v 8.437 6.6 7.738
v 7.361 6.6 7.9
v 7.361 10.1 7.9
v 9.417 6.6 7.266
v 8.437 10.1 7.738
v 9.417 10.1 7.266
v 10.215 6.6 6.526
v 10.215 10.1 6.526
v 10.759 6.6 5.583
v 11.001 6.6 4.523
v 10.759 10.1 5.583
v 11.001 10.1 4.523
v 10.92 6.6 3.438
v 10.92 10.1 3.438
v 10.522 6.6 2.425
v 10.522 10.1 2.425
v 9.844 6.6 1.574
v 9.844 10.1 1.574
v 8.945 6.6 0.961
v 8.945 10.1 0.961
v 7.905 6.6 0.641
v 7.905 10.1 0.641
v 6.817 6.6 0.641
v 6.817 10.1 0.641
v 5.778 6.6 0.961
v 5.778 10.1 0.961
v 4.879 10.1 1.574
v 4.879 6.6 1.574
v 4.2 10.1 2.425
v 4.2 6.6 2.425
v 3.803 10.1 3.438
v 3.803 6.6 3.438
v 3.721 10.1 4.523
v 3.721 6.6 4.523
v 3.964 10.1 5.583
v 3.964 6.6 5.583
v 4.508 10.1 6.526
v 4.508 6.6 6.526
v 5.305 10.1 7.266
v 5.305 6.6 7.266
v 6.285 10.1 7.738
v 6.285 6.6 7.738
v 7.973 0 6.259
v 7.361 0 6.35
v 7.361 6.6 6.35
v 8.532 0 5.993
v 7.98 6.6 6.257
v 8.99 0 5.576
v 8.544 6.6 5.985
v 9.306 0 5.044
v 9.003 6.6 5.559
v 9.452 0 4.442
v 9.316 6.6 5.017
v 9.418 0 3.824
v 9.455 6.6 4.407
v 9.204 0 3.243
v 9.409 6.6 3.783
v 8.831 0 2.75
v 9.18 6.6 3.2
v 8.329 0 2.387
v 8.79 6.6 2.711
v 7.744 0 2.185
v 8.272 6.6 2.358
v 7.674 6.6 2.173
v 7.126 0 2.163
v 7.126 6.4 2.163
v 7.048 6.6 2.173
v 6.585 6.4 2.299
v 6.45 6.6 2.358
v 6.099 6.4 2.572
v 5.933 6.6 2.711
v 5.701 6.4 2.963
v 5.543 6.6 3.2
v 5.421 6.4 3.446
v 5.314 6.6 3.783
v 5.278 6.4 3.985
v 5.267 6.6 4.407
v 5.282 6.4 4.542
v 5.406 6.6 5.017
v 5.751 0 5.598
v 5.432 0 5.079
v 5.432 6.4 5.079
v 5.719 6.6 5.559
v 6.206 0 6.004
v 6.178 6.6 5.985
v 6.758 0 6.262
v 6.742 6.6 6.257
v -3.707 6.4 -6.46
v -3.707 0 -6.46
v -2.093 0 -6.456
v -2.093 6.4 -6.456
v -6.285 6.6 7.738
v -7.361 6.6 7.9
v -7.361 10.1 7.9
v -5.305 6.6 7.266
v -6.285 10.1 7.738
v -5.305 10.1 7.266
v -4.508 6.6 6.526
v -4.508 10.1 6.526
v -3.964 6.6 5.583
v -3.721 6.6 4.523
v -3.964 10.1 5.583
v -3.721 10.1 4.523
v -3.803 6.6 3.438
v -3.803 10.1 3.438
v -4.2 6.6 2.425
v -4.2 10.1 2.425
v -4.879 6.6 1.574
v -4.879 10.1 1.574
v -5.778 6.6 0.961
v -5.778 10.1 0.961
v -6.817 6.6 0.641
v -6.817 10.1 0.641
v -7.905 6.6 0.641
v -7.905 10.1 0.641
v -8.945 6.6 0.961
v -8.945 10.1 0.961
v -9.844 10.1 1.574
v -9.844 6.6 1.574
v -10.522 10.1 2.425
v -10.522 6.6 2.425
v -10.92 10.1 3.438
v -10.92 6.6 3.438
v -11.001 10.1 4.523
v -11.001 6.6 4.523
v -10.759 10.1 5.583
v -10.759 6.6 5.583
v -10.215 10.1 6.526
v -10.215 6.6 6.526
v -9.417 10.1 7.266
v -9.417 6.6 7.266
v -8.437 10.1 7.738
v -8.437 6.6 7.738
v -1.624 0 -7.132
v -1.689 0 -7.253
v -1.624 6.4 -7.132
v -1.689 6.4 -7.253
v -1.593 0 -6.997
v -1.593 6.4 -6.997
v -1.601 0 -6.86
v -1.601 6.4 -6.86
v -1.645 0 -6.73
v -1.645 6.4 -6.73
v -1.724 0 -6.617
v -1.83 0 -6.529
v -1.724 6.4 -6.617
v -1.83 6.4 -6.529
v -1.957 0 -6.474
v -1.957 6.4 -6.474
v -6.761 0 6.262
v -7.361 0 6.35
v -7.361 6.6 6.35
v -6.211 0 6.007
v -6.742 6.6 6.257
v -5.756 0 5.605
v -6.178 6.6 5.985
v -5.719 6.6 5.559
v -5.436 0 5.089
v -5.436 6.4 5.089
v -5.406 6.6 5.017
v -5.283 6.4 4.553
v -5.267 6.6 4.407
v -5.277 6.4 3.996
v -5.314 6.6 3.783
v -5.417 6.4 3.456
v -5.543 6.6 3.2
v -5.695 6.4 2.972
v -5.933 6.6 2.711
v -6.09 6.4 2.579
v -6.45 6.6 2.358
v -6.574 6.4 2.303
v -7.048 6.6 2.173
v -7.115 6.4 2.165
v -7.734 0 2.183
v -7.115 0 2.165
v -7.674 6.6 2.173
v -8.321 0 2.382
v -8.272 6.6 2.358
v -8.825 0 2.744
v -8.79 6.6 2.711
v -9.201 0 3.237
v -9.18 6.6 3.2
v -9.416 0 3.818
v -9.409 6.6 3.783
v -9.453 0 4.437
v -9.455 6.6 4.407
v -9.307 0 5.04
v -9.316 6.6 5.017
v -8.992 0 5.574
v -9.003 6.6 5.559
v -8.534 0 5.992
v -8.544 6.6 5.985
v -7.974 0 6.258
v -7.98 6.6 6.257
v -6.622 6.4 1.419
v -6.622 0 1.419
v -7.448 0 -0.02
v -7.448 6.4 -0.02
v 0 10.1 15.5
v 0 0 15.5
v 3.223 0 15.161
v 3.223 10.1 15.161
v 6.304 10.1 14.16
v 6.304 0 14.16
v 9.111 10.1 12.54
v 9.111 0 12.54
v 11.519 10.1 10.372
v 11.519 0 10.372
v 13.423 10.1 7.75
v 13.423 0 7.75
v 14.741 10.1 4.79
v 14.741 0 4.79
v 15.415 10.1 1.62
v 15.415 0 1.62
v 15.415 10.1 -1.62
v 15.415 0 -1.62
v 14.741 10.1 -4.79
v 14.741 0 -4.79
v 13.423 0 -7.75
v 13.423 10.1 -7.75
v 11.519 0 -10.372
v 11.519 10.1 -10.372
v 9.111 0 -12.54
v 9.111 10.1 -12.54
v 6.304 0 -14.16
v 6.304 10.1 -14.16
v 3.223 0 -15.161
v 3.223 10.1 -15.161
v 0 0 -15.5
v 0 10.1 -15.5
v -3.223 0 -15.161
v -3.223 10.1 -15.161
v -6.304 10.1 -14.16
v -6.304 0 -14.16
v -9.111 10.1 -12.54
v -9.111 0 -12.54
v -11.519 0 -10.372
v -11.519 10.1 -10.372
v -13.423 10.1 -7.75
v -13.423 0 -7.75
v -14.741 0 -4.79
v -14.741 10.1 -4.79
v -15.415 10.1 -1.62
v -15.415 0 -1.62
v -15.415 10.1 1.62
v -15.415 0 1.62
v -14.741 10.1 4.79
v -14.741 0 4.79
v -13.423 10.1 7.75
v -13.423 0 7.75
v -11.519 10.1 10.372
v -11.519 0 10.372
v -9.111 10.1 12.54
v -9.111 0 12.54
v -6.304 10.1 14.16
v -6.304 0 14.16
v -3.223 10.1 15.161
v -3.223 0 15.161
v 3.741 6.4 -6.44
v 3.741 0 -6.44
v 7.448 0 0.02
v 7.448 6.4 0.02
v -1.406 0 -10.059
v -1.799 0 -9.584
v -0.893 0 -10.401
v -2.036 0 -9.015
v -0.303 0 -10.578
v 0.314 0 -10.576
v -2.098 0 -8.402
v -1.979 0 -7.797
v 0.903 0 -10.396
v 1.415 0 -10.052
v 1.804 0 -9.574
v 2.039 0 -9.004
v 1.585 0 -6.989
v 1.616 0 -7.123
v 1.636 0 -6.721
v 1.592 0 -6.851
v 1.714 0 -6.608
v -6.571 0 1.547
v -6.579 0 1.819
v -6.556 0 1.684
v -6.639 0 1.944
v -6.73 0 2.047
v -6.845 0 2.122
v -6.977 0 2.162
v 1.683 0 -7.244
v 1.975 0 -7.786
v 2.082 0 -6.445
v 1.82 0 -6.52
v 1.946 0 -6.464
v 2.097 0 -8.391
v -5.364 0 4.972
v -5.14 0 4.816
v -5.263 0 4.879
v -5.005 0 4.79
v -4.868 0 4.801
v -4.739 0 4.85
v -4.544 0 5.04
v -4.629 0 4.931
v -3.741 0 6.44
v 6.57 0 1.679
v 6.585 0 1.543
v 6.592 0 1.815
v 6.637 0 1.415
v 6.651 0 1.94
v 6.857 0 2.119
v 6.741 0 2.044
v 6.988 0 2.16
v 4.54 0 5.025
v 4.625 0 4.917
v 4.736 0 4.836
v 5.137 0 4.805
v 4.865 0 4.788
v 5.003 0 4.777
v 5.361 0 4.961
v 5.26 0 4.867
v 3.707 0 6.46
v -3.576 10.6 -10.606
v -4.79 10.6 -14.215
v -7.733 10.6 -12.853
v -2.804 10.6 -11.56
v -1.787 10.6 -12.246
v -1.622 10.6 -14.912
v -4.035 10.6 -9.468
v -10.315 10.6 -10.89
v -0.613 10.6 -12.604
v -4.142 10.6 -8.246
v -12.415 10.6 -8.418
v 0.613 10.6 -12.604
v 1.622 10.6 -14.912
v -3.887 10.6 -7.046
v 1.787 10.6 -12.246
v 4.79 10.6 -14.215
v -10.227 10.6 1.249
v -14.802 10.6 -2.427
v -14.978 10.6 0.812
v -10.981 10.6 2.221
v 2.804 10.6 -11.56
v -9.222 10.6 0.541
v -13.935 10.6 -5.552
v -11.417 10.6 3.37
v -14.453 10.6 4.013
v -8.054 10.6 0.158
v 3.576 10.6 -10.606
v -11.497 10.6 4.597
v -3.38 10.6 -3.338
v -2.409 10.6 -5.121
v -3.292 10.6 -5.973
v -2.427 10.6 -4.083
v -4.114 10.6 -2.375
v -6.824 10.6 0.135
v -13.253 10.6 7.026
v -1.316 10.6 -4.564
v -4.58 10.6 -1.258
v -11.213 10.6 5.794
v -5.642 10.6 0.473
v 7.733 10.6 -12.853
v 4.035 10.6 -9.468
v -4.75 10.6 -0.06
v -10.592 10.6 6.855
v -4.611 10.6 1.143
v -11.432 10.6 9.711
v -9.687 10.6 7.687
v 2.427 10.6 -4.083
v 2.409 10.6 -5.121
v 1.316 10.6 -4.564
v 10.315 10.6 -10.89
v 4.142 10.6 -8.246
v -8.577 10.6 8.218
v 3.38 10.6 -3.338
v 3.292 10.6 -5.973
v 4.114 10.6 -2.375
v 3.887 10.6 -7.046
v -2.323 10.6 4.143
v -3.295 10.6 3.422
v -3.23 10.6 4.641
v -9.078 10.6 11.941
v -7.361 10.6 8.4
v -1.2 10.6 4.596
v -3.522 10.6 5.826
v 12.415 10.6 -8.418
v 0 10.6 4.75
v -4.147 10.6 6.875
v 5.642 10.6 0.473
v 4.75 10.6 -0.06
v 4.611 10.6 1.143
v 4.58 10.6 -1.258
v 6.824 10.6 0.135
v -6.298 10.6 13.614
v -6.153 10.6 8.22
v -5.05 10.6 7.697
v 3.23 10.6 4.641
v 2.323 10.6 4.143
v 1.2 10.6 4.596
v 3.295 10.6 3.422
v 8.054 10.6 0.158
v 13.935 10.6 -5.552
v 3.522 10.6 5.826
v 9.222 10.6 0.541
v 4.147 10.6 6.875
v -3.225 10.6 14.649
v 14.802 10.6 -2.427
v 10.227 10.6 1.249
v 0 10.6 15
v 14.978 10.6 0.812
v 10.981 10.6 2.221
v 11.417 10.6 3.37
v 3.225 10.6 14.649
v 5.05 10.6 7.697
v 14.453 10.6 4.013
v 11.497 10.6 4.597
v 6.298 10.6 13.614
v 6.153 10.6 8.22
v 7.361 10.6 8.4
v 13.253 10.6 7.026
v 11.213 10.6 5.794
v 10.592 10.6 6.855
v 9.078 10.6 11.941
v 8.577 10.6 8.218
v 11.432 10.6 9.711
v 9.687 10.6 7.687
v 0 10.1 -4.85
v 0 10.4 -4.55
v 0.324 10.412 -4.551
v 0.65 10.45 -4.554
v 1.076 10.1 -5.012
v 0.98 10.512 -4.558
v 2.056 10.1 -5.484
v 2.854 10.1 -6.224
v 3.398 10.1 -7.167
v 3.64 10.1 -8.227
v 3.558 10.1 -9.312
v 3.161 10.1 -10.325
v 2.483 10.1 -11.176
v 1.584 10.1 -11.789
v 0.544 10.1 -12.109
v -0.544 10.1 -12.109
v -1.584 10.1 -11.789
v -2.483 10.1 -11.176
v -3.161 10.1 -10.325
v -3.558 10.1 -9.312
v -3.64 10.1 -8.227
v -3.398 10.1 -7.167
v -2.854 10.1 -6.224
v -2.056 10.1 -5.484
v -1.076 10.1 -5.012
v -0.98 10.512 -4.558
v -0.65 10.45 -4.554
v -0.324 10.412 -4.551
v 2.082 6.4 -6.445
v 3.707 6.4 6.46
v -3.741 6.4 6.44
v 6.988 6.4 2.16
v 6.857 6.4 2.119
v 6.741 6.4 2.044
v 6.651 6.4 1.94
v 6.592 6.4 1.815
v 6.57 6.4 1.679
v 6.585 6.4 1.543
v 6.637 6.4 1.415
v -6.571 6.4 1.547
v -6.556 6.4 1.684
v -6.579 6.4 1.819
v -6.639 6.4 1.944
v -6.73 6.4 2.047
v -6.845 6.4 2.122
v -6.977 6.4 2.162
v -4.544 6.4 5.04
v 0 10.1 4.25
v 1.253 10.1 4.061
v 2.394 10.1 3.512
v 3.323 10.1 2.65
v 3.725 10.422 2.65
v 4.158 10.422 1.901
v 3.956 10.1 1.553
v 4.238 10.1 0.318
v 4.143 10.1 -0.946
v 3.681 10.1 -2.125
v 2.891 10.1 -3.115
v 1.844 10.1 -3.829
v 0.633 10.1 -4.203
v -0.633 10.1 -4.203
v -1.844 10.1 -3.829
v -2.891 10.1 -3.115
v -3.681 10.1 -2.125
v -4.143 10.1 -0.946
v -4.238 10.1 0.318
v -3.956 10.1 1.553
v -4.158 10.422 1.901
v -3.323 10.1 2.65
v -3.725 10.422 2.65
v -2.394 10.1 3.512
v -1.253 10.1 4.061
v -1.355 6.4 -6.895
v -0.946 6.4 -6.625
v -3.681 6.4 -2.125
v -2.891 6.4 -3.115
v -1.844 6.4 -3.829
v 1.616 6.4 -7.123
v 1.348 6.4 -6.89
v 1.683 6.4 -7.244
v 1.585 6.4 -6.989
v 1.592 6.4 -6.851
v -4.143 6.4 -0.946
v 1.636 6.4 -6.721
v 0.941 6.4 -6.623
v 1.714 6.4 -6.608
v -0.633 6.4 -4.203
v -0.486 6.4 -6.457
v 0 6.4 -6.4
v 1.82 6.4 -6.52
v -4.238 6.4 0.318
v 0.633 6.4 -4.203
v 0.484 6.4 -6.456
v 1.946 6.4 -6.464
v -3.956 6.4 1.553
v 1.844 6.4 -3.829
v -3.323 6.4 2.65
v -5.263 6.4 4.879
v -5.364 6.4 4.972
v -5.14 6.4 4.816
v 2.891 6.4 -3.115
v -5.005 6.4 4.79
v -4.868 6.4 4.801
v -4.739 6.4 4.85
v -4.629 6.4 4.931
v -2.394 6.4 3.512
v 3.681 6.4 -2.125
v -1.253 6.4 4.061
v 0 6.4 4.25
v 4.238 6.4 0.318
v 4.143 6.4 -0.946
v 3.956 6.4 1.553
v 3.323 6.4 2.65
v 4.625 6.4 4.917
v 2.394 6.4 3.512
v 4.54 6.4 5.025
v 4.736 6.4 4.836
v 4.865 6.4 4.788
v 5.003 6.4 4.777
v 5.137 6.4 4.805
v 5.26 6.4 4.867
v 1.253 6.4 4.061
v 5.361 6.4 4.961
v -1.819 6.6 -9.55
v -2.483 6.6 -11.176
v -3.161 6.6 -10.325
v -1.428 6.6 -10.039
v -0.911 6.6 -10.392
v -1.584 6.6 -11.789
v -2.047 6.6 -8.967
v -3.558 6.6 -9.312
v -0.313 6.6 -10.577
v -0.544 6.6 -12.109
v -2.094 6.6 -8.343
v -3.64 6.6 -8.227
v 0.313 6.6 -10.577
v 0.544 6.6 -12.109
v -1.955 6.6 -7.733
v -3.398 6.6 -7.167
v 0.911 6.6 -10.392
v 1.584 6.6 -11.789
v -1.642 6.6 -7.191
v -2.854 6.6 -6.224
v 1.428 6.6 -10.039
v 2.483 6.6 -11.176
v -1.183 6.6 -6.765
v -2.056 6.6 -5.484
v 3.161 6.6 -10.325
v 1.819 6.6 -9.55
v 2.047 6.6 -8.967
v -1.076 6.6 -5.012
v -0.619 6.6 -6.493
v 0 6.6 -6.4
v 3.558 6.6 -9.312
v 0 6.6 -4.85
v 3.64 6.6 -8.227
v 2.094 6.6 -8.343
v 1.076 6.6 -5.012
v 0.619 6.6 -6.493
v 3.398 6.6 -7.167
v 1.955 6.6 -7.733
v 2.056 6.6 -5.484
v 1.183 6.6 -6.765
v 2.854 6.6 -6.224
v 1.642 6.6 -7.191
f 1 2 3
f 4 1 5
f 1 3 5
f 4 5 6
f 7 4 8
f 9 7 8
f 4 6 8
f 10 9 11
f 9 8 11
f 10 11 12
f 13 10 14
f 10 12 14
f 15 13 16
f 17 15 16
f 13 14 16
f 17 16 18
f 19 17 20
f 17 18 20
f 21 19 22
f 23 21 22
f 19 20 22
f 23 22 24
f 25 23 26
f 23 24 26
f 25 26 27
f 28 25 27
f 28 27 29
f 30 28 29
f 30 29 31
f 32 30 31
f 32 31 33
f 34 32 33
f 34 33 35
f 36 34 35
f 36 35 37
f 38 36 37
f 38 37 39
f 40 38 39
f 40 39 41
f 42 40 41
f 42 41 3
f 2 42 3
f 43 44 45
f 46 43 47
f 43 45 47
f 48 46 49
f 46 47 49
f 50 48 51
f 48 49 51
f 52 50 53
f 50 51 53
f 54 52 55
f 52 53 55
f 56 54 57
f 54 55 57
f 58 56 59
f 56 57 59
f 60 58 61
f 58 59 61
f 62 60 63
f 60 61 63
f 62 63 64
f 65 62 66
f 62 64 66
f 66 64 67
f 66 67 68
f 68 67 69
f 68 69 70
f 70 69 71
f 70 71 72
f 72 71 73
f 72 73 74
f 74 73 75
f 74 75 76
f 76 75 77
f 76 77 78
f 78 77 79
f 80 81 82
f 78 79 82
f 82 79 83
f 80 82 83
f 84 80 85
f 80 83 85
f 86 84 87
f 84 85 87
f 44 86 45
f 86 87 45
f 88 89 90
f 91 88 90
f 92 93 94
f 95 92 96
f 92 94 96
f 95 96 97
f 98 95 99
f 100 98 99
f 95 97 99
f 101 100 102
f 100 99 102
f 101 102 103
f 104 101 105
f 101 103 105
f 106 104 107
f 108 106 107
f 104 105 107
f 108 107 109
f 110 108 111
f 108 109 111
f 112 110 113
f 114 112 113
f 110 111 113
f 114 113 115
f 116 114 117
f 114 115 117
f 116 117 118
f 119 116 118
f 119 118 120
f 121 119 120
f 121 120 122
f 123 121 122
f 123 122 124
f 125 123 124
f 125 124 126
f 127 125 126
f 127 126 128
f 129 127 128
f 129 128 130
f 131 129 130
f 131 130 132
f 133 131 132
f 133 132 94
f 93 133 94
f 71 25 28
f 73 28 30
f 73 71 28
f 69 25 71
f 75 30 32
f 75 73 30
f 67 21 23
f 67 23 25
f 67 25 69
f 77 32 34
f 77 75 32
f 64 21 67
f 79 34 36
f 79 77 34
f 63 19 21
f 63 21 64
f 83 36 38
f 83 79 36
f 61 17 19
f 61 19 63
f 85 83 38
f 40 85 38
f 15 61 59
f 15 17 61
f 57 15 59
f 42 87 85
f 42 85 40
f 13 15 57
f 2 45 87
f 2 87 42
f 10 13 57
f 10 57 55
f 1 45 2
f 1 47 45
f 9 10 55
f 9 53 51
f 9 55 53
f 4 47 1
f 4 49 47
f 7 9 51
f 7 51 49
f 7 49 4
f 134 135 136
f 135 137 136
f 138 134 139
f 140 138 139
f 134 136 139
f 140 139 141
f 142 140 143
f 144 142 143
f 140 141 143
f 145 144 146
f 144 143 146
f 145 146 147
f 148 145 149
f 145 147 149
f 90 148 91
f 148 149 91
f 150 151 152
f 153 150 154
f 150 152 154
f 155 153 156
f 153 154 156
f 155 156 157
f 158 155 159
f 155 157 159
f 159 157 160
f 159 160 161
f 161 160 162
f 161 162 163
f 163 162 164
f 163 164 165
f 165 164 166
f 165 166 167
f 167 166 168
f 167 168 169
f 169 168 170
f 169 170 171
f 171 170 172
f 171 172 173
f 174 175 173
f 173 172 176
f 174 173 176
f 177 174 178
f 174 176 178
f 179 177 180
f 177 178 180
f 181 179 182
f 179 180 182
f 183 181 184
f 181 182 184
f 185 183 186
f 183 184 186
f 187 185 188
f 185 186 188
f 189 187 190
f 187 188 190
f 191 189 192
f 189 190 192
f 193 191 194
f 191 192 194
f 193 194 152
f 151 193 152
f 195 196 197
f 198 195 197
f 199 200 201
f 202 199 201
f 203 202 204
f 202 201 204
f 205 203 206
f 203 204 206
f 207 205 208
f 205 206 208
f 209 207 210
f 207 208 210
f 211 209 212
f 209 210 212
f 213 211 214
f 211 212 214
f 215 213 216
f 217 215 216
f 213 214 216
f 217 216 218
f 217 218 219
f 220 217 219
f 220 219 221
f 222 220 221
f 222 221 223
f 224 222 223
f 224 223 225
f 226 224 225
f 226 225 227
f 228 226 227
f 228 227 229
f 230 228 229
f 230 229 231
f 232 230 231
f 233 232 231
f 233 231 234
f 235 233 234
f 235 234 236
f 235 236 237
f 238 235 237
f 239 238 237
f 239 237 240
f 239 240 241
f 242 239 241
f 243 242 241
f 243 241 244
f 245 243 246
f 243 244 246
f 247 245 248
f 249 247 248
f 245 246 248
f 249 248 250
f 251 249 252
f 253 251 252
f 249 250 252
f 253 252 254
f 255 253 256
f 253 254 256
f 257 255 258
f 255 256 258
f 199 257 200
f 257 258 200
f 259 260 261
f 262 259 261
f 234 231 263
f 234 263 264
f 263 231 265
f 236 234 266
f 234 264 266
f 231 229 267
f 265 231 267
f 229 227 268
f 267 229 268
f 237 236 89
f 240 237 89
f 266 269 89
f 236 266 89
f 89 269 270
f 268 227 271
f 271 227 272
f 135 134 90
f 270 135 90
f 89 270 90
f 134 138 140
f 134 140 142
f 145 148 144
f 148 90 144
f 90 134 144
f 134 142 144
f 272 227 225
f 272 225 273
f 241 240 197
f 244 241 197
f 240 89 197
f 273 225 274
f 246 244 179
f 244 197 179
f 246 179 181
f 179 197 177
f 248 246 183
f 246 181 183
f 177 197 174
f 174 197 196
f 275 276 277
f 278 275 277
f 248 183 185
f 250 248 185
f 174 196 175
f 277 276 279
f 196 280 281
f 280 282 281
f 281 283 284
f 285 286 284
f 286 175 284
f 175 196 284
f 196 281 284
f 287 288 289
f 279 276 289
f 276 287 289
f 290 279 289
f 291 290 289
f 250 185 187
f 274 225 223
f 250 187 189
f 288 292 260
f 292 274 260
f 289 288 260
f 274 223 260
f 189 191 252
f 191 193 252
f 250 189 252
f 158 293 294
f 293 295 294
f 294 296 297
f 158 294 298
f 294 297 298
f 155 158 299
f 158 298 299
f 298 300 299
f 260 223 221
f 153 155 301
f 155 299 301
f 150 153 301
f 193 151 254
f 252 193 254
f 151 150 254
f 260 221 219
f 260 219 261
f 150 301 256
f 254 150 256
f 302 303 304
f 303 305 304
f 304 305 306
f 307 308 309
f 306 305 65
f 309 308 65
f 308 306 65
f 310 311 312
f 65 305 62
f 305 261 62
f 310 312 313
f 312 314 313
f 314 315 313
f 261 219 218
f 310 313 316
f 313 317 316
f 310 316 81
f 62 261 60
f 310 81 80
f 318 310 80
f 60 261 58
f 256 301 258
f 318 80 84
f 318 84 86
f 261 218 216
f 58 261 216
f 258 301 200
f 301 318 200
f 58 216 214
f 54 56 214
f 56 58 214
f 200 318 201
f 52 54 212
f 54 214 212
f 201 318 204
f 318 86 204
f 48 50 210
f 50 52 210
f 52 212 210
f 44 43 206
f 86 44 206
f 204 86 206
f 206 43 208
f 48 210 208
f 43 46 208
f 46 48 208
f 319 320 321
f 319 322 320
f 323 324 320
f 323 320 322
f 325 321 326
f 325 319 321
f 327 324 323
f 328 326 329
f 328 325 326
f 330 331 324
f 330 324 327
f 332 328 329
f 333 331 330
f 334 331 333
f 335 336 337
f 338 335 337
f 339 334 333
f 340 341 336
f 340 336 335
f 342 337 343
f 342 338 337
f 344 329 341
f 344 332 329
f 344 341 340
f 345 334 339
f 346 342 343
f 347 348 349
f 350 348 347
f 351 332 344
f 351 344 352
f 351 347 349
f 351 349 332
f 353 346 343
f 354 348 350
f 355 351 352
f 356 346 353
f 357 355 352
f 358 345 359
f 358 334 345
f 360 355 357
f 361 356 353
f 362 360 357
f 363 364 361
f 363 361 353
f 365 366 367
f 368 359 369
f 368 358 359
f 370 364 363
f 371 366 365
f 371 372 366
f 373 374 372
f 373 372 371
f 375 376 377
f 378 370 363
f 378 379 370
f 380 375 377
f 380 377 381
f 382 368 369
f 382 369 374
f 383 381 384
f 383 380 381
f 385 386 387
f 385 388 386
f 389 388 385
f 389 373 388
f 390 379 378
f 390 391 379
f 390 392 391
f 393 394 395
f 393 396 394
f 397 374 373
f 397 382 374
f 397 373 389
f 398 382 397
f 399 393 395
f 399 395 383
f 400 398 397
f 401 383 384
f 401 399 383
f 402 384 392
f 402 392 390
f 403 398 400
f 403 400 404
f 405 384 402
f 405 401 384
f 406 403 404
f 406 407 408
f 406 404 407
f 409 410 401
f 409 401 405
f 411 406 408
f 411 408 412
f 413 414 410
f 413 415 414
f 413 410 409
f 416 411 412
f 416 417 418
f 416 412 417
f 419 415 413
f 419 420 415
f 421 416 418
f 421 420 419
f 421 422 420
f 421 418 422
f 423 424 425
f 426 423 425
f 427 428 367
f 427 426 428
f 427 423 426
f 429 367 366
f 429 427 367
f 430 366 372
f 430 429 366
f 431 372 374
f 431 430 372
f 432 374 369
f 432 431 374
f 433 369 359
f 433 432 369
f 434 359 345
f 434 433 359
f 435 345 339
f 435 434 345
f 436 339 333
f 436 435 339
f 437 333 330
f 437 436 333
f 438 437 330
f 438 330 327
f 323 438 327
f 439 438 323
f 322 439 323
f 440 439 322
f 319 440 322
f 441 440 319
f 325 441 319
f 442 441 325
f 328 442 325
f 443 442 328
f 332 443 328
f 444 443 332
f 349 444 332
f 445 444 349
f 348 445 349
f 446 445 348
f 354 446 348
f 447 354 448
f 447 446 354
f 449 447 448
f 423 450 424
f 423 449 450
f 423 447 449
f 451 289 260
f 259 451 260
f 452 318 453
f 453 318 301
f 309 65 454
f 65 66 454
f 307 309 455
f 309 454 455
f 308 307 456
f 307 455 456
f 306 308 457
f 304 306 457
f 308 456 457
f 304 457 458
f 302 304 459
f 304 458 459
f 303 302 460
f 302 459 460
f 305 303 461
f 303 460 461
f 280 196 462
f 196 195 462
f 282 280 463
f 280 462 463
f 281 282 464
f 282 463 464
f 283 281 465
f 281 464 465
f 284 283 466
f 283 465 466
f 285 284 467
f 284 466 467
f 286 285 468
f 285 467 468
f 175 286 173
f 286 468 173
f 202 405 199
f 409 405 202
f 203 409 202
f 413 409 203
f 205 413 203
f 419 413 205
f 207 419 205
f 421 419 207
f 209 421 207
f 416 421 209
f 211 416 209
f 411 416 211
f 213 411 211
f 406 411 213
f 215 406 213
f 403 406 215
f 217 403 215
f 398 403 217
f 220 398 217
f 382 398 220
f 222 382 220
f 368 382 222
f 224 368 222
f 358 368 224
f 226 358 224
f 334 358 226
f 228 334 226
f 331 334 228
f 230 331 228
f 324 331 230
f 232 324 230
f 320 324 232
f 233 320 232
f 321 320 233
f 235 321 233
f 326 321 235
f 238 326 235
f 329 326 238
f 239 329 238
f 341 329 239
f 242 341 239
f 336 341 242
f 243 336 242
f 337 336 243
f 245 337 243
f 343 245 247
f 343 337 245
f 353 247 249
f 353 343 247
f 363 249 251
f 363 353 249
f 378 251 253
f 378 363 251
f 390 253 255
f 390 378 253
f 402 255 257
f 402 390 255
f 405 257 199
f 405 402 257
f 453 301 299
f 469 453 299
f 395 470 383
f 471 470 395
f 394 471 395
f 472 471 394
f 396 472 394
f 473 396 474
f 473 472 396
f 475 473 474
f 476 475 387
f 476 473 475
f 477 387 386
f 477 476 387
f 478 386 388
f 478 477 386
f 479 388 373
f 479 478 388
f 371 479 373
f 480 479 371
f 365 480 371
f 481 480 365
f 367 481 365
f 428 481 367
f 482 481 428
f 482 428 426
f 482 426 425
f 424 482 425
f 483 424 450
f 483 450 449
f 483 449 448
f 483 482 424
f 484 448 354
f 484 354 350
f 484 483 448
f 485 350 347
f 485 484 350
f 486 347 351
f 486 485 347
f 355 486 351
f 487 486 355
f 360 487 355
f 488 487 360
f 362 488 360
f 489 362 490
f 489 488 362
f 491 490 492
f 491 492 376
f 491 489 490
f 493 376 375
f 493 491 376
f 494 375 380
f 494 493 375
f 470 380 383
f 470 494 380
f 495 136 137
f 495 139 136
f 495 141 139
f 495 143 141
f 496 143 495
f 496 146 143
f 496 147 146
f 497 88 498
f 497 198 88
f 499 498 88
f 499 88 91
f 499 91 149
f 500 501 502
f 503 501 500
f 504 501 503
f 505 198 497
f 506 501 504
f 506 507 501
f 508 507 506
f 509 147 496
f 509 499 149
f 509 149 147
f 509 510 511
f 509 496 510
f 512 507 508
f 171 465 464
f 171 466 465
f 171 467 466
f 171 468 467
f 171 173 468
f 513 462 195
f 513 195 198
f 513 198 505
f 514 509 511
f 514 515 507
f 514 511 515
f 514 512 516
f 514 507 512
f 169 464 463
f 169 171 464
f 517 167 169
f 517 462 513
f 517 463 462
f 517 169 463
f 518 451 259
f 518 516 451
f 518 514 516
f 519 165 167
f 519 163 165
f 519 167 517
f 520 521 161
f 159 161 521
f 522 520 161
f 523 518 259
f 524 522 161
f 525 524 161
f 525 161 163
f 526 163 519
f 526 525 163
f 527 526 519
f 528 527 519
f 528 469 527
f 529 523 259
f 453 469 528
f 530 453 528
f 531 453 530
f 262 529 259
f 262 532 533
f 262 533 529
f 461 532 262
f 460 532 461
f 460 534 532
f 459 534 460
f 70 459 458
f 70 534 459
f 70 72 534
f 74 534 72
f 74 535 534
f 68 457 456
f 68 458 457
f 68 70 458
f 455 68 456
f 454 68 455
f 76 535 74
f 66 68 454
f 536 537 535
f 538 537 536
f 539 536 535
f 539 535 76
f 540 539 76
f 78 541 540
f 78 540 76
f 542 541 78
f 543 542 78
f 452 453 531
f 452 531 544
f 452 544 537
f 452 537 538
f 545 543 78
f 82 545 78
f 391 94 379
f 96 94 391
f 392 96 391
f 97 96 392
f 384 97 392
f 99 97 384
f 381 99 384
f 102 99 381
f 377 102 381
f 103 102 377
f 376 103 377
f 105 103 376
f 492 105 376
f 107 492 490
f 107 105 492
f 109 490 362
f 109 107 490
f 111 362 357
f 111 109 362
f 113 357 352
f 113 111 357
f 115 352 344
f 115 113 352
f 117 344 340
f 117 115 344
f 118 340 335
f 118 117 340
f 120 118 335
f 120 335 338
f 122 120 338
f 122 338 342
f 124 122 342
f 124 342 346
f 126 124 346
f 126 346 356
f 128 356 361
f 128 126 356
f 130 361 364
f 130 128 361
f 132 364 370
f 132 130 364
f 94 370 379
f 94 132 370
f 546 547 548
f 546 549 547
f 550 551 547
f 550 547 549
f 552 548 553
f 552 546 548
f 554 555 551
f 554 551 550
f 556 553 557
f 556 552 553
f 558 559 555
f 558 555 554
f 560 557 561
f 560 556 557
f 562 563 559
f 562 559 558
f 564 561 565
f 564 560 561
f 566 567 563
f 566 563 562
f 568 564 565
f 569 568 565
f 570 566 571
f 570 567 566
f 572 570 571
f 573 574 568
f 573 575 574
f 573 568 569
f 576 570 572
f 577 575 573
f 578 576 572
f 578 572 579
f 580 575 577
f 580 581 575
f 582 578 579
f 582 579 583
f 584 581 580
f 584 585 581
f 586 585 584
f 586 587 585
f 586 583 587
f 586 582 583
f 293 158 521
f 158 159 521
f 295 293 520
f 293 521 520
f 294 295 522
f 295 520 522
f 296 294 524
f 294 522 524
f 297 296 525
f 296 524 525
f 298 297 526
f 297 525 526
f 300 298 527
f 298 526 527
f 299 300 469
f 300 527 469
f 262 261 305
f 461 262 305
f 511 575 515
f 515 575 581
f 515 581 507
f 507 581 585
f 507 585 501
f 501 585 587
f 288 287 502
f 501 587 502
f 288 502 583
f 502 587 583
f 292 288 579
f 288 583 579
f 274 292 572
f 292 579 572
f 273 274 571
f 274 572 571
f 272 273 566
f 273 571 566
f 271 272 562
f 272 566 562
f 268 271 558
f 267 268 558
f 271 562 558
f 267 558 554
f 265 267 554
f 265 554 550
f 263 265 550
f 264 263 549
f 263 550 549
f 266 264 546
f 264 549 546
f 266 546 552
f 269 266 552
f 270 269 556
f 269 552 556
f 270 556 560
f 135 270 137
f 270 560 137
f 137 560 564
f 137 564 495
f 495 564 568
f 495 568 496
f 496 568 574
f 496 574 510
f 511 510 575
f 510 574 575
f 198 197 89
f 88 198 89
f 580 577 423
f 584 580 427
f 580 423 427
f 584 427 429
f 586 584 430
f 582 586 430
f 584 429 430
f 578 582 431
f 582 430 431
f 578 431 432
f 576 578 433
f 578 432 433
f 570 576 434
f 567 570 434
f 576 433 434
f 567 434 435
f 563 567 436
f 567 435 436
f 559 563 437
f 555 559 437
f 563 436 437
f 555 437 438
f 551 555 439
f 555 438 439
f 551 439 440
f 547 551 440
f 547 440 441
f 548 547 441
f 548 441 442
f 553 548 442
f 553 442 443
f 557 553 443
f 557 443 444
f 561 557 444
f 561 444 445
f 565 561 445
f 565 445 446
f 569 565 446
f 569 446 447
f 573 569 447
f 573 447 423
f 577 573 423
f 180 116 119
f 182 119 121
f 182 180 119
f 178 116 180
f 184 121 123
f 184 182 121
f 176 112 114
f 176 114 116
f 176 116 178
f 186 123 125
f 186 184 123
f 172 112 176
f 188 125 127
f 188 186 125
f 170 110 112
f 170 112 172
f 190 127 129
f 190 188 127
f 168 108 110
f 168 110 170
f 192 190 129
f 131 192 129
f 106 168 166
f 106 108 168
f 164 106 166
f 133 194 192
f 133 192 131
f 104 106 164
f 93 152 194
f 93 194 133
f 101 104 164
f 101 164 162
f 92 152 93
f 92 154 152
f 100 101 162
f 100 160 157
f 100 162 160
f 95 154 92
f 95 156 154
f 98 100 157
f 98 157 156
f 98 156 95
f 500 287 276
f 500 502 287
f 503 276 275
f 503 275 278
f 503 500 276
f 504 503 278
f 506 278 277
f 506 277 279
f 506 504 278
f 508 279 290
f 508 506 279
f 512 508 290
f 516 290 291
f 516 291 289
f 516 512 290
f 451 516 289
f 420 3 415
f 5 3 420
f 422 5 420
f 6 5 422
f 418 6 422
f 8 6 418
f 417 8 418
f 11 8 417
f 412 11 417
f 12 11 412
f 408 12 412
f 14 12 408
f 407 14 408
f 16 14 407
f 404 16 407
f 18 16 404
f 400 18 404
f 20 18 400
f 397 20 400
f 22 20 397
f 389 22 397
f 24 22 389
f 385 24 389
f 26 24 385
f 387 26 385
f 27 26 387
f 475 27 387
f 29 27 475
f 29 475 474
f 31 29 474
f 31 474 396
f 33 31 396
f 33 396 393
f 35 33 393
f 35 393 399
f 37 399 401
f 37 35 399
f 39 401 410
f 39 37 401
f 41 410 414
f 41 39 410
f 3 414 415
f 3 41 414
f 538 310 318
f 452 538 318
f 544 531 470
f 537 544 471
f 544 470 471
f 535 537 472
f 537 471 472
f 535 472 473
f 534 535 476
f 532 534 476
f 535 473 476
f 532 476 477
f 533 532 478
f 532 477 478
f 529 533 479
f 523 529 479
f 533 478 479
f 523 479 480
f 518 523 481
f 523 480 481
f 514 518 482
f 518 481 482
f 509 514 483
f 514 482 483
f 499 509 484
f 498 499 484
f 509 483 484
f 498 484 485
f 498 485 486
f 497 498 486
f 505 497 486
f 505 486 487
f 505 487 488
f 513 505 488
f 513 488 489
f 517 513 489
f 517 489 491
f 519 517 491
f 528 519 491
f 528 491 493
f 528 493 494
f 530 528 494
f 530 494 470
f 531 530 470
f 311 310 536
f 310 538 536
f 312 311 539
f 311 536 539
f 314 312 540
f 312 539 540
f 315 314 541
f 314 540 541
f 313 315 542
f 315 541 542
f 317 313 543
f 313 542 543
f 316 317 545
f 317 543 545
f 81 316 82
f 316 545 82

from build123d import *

# Parameters (mm, degrees)
SKETCH1_R           = 15.5
BOSS_EXTRUDE1_DEPTH = 10.6
SKETCH2_R           = 2.1
CUT_EXTRUDE1_DEPTH  = 25.348716599
SKETCH3_R           = 4.25
CUT_EXTRUDE2_DEPTH  = 25.348716599
CUT_EXTRUDE3_DEPTH  = 6.4
SKETCH5_R           = 3.65
CUT_EXTRUDE4_DEPTH  = 4
CHAMFER1_SIZE       = 0.5
FILLET_1_R          = 0.5


with BuildPart() as part:
    # Sketch1 → Boss-Extrude1 (new body)
    with BuildSketch(Plane(origin=(0, 0, 0), x_dir=(1, 0, 0), z_dir=(0, 1, 0))):
        with Locations(Location((0, 0, 0), (0, 0, 270))):
            Circle(SKETCH1_R)
    extrude(amount=BOSS_EXTRUDE1_DEPTH)

    # Sketch2 → Cut-Extrude1 (cut, through all)
    with BuildSketch(Plane(origin=(0, 10.6, 0), x_dir=(1, 0, 0), z_dir=(0, 1, 0))):
        with Locations(Location((0, 8.5, 0), (0, 0, 270))):
            Circle(SKETCH2_R)
        with Locations(Location((7.361215932, -4.25, 0), (0, 0, 270))):
            Circle(SKETCH2_R)
        with Locations(Location((-7.361215932, -4.25, 0), (0, 0, 270))):
            Circle(SKETCH2_R)
    extrude(amount=-CUT_EXTRUDE1_DEPTH, mode=Mode.SUBTRACT)

    # Sketch3 → Cut-Extrude2 (cut, through all)
    with BuildSketch(Plane(origin=(0, 10.6, 0), x_dir=(1, 0, 0), z_dir=(0, 1, 0))):
        with Locations(Location((0, 0, 0), (0, 0, 270))):
            Circle(SKETCH3_R)
    extrude(amount=-CUT_EXTRUDE2_DEPTH, mode=Mode.SUBTRACT)

    # Sketch4 → Cut-Extrude3 (cut)
    with BuildSketch(Plane.XZ):
        Polygon((3.740942098, -6.44013604), (7.447792464, 0.019682871), (3.706850366, 6.459818911), (-3.740942098, 6.44013604), (-7.447792464, -0.019682871), (-3.706850366, -6.459818911), align=None)
    extrude(amount=-CUT_EXTRUDE3_DEPTH, mode=Mode.SUBTRACT)

    # Sketch5 → Cut-Extrude4 (cut)
    with BuildSketch(Plane(origin=(0, 10.6, 0), x_dir=(1, 0, 0), z_dir=(0, 1, 0))):
        with Locations(Location((0, 8.5, 0), (0, 0, 270))):
            Circle(SKETCH5_R)
        with Locations(Location((7.361215932, -4.25, 0), (0, 0, 270))):
            Circle(SKETCH5_R)
        with Locations(Location((-7.361215932, -4.25, 0), (0, 0, 270))):
            Circle(SKETCH5_R)
    extrude(amount=-CUT_EXTRUDE4_DEPTH, mode=Mode.SUBTRACT)

    # Chamfer1
    # the kernel refuses this chamfer: 0.5 mm, written as the material it takes off along each edge
    with BuildSketch(Plane(origin=(0, 10.6, 0), x_dir=(0, 0, 1), z_dir=(-1, 0, 0))) as chamfer1_piece_1:
        Polygon((4.25 + CHAMFER1_SIZE, 0), (4.25, -CHAMFER1_SIZE), (4.25, 0), align=None)
    revolve(axis=Axis((0, 10.6, 0), (0, 1, 0)), mode=Mode.SUBTRACT)
    with BuildSketch(Plane(origin=(0, 10.6, 0), x_dir=(0, 0, 1), z_dir=(-1, 0, 0))) as chamfer1_piece_2:
        Polygon((15.5, -CHAMFER1_SIZE), (15.5 - CHAMFER1_SIZE, 0), (15.5, 0), align=None)
    revolve(axis=Axis((0, 10.6, 0), (0, 1, 0)), mode=Mode.SUBTRACT)
    with BuildSketch(Plane(origin=(0, 10.6, -8.5), x_dir=(0, 0, 1), z_dir=(-1, 0, 0))) as chamfer1_piece_3:
        Polygon((3.65 + CHAMFER1_SIZE, 0), (3.65, -CHAMFER1_SIZE), (3.65, 0), align=None)
    revolve(axis=Axis((0, 10.6, -8.5), (0, 1, 0)), mode=Mode.SUBTRACT)
    with BuildSketch(Plane(origin=(7.361215932, 10.6, 4.25), x_dir=(0, 0, 1), z_dir=(-1, 0, 0))) as chamfer1_piece_4:
        Polygon((3.65 + CHAMFER1_SIZE, 0), (3.65, -CHAMFER1_SIZE), (3.65, 0), align=None)
    revolve(axis=Axis((7.361215932, 10.6, 4.25), (0, 1, 0)), mode=Mode.SUBTRACT)
    with BuildSketch(Plane(origin=(-7.361215932, 10.6, 4.25), x_dir=(0, 0, 1), z_dir=(-1, 0, 0))) as chamfer1_piece_5:
        Polygon((3.65 + CHAMFER1_SIZE, 0), (3.65, -CHAMFER1_SIZE), (3.65, 0), align=None)
    revolve(axis=Axis((-7.361215932, 10.6, 4.25), (0, 1, 0)), mode=Mode.SUBTRACT)

    # Скругление1
    fillet_1_edges = [part.edges().sort_by_distance(p)[0] for p in [
        (5.359734874, 3.2, 3.614332183),
        (5.817474247, 3.2, 2.826321101),
        (-5.809970925, 3.2, 2.834500467),
        (-5.356402996, 3.2, 3.624919933),
        (0.450236051, 3.2, -6.44883265),
        (-0.461071251, 3.2, -6.451241034),
    ]]
    fillet(fillet_1_edges, radius=FILLET_1_R)


solid = part.part
